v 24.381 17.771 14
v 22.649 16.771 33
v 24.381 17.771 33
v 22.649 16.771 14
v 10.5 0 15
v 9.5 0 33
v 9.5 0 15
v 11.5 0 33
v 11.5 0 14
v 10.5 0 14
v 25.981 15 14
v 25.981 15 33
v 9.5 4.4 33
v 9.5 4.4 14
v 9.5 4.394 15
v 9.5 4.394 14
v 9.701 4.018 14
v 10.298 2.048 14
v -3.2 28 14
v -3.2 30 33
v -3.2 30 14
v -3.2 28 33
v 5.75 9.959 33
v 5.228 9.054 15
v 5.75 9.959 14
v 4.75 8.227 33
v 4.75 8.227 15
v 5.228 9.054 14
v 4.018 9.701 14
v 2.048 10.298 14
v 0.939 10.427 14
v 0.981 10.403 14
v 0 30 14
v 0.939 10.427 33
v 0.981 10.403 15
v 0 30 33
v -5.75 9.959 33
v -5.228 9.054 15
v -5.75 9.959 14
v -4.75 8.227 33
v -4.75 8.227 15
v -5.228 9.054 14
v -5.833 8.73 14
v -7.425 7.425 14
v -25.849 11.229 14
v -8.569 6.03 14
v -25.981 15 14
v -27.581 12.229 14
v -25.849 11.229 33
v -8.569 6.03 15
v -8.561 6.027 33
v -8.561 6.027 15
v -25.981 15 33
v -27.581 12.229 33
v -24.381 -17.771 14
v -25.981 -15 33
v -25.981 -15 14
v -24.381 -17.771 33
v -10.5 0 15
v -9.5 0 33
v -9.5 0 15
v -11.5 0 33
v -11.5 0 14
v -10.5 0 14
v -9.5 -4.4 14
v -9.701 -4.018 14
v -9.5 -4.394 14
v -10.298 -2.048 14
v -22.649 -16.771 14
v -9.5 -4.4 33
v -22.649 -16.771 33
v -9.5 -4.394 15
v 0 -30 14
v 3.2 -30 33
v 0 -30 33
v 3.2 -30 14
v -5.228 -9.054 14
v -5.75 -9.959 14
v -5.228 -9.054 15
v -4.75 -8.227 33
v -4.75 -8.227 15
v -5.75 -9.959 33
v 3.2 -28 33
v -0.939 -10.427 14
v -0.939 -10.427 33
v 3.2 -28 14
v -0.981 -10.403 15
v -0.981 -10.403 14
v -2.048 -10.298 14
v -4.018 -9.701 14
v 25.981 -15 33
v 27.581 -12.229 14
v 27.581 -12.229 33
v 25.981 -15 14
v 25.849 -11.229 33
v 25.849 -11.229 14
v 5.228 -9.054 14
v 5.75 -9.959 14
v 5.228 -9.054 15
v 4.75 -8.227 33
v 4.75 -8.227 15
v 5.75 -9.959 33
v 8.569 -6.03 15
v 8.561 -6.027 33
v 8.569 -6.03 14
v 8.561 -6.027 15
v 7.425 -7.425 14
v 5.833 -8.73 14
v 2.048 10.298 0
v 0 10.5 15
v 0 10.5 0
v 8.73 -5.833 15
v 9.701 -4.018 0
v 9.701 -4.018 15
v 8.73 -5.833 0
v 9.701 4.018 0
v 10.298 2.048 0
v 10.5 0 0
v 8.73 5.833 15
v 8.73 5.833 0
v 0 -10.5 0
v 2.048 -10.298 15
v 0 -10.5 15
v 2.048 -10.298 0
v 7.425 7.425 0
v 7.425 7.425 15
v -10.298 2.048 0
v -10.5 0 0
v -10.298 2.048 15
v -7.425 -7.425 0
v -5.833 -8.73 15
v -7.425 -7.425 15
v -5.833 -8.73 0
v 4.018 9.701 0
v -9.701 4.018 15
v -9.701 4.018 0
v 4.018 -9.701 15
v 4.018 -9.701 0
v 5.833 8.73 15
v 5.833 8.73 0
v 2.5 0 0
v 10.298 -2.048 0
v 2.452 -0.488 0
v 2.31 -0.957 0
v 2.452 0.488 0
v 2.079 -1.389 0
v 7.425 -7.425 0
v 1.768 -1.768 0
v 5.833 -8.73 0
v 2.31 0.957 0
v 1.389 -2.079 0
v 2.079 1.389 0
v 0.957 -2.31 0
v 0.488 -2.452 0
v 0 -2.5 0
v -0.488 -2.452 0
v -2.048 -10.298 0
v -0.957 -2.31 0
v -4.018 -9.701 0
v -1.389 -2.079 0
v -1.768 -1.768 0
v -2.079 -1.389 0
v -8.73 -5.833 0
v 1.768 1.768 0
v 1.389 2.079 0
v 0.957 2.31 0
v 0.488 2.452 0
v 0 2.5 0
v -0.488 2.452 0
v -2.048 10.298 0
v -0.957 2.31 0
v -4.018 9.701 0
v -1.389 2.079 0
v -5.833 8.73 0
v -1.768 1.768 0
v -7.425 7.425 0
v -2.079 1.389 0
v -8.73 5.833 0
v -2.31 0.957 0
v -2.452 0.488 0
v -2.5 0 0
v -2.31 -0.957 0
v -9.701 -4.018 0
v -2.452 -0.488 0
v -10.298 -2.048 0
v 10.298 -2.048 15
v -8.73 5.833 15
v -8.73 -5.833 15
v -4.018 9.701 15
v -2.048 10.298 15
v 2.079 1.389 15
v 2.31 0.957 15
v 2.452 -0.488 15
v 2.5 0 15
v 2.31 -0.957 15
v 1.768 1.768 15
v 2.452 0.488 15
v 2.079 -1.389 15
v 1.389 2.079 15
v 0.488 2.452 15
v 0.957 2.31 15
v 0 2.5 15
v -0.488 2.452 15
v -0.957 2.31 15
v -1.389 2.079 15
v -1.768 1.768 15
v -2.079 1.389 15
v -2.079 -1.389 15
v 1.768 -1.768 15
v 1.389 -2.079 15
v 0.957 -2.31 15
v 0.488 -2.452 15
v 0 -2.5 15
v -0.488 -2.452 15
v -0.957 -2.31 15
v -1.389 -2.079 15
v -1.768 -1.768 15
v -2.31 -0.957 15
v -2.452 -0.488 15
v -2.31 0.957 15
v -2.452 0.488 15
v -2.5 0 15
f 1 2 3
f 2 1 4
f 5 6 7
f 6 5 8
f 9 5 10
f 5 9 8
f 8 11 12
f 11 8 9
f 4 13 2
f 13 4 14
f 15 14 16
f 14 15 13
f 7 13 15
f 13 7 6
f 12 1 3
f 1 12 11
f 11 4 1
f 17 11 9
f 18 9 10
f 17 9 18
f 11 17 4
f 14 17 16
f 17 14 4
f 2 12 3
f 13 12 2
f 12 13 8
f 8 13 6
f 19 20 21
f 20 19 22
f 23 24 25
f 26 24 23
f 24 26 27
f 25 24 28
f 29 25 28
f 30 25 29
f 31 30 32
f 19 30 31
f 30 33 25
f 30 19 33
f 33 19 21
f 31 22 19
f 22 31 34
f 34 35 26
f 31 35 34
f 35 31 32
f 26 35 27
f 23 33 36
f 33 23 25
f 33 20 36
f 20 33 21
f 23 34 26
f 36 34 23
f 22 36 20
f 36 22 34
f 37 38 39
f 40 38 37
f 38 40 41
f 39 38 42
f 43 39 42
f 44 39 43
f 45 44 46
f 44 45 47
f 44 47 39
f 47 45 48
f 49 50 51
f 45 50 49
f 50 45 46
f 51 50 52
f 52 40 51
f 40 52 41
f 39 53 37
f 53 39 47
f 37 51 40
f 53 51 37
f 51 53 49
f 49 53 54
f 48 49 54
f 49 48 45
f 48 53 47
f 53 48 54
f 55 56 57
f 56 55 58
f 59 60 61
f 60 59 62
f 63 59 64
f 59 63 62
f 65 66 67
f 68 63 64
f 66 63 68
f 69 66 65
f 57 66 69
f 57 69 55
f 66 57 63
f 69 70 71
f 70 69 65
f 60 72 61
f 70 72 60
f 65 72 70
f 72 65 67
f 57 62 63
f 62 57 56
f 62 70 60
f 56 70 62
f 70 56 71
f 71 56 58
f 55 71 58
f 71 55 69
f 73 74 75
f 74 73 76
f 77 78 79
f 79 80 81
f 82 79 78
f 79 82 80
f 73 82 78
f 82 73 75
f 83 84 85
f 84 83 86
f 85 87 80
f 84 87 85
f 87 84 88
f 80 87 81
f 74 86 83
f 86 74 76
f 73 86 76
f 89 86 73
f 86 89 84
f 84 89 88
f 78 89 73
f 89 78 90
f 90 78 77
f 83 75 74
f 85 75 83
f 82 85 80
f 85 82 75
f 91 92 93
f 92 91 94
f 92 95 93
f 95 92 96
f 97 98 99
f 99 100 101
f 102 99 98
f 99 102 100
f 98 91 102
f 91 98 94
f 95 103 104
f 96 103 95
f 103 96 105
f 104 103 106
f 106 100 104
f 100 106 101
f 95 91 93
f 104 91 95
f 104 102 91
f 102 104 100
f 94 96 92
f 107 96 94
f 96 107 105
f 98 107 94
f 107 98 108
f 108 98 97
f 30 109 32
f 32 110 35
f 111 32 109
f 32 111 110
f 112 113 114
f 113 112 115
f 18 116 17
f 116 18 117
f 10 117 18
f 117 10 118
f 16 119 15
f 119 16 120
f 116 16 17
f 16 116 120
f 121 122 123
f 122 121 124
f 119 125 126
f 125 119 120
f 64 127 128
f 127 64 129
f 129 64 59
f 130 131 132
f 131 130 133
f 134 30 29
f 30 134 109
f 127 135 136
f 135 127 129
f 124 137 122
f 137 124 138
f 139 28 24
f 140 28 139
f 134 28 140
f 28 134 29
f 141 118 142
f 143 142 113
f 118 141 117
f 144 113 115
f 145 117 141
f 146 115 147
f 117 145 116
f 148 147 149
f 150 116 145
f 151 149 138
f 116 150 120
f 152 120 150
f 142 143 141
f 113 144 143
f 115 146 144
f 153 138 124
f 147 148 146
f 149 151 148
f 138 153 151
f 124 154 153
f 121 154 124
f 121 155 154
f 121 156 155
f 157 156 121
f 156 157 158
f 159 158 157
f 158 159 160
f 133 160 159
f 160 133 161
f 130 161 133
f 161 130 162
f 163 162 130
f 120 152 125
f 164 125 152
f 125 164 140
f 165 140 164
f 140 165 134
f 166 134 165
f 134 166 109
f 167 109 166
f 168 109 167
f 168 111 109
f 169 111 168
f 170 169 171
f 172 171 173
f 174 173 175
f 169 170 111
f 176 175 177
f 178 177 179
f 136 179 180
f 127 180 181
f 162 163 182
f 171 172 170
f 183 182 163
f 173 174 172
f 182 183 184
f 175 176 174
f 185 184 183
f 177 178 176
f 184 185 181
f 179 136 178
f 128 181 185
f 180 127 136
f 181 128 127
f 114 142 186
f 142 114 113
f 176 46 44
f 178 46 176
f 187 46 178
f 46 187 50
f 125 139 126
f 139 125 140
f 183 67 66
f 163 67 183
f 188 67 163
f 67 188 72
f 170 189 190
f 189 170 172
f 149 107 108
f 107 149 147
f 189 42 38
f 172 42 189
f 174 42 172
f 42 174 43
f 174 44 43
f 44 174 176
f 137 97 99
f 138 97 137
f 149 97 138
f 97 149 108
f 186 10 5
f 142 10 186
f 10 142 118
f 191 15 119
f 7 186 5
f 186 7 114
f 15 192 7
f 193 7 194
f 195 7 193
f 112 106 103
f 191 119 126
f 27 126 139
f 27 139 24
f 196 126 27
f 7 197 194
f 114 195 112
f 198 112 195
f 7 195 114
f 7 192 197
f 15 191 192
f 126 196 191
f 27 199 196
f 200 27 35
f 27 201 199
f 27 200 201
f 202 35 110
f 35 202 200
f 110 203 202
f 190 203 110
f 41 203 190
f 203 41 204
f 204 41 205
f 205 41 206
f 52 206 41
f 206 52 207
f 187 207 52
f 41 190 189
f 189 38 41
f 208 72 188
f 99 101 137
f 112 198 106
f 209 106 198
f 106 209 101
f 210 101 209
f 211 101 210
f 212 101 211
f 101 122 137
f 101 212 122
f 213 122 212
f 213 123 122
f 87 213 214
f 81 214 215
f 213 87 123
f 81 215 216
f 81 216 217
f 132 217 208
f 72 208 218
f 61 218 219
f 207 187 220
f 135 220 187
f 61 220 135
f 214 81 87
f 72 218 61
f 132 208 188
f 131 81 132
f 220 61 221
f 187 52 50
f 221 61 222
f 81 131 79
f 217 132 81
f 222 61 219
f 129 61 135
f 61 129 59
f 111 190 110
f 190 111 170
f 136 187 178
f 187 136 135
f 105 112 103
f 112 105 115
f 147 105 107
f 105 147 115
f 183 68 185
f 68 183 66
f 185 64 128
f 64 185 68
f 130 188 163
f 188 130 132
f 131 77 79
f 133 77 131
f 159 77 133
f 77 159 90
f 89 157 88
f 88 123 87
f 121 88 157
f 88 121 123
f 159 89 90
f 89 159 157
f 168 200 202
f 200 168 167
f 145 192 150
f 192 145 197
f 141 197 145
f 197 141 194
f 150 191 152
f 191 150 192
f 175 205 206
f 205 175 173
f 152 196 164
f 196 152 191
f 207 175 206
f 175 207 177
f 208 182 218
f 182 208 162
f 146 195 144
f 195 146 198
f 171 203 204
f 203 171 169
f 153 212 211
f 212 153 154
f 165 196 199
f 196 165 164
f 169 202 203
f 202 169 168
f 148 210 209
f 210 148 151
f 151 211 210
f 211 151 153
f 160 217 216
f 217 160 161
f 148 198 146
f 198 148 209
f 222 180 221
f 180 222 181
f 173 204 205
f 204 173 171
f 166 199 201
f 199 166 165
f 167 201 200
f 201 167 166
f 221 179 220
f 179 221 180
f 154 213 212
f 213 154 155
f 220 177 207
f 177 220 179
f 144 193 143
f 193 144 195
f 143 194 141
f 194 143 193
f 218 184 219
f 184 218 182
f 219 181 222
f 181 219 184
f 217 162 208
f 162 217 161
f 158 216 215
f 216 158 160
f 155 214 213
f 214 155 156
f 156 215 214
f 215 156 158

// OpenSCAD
$fn = 32;

// ----------------------------------------------------------------------
// Impeller: 60 mm, 6 blades, 33 mm tall
// ----------------------------------------------------------------------

// --- parameters (mm) ---
boss_d = 21;              // hub diameter
boss_h = 15;              // hub height
rotor_d = 60;             // outer diameter over the blades
vane_count = 6;           // number of blades
blade_t = 2;              // blade thickness
blade_h = 18;             // blade height
blade_in_r = 9.5;         // blade root radius
blade_out_r = 28;         // blade tip radius
sweep = 30;               // blade sweep, degrees
bore_d = 5;               // shaft bore

module hub() {
  cylinder(h = boss_h, d = boss_d);
}

module blade() {
  /* blade swept between two boxes: hull of the root and the tip section */
  hull() {
    translate([blade_in_r, 0, boss_h - 1])
      cube([blade_t, blade_t * 2.2, blade_h + 1], center = false);
    rotate([0, 0, sweep])
      translate([blade_out_r, 0, boss_h - 1])
        cube([blade_t, blade_t * 1.6, blade_h + 1], center = false);
  }
}

module blades() {
  for (i = [0 : vane_count - 1])
    rotate([0, 0, i * 360 / vane_count]) blade();
}

difference() {
  union() {
    hub();
    blades();
  }
  translate([0, 0, -1]) cylinder(h = boss_h + blade_h + 0 + 3, d = bore_d);
}
